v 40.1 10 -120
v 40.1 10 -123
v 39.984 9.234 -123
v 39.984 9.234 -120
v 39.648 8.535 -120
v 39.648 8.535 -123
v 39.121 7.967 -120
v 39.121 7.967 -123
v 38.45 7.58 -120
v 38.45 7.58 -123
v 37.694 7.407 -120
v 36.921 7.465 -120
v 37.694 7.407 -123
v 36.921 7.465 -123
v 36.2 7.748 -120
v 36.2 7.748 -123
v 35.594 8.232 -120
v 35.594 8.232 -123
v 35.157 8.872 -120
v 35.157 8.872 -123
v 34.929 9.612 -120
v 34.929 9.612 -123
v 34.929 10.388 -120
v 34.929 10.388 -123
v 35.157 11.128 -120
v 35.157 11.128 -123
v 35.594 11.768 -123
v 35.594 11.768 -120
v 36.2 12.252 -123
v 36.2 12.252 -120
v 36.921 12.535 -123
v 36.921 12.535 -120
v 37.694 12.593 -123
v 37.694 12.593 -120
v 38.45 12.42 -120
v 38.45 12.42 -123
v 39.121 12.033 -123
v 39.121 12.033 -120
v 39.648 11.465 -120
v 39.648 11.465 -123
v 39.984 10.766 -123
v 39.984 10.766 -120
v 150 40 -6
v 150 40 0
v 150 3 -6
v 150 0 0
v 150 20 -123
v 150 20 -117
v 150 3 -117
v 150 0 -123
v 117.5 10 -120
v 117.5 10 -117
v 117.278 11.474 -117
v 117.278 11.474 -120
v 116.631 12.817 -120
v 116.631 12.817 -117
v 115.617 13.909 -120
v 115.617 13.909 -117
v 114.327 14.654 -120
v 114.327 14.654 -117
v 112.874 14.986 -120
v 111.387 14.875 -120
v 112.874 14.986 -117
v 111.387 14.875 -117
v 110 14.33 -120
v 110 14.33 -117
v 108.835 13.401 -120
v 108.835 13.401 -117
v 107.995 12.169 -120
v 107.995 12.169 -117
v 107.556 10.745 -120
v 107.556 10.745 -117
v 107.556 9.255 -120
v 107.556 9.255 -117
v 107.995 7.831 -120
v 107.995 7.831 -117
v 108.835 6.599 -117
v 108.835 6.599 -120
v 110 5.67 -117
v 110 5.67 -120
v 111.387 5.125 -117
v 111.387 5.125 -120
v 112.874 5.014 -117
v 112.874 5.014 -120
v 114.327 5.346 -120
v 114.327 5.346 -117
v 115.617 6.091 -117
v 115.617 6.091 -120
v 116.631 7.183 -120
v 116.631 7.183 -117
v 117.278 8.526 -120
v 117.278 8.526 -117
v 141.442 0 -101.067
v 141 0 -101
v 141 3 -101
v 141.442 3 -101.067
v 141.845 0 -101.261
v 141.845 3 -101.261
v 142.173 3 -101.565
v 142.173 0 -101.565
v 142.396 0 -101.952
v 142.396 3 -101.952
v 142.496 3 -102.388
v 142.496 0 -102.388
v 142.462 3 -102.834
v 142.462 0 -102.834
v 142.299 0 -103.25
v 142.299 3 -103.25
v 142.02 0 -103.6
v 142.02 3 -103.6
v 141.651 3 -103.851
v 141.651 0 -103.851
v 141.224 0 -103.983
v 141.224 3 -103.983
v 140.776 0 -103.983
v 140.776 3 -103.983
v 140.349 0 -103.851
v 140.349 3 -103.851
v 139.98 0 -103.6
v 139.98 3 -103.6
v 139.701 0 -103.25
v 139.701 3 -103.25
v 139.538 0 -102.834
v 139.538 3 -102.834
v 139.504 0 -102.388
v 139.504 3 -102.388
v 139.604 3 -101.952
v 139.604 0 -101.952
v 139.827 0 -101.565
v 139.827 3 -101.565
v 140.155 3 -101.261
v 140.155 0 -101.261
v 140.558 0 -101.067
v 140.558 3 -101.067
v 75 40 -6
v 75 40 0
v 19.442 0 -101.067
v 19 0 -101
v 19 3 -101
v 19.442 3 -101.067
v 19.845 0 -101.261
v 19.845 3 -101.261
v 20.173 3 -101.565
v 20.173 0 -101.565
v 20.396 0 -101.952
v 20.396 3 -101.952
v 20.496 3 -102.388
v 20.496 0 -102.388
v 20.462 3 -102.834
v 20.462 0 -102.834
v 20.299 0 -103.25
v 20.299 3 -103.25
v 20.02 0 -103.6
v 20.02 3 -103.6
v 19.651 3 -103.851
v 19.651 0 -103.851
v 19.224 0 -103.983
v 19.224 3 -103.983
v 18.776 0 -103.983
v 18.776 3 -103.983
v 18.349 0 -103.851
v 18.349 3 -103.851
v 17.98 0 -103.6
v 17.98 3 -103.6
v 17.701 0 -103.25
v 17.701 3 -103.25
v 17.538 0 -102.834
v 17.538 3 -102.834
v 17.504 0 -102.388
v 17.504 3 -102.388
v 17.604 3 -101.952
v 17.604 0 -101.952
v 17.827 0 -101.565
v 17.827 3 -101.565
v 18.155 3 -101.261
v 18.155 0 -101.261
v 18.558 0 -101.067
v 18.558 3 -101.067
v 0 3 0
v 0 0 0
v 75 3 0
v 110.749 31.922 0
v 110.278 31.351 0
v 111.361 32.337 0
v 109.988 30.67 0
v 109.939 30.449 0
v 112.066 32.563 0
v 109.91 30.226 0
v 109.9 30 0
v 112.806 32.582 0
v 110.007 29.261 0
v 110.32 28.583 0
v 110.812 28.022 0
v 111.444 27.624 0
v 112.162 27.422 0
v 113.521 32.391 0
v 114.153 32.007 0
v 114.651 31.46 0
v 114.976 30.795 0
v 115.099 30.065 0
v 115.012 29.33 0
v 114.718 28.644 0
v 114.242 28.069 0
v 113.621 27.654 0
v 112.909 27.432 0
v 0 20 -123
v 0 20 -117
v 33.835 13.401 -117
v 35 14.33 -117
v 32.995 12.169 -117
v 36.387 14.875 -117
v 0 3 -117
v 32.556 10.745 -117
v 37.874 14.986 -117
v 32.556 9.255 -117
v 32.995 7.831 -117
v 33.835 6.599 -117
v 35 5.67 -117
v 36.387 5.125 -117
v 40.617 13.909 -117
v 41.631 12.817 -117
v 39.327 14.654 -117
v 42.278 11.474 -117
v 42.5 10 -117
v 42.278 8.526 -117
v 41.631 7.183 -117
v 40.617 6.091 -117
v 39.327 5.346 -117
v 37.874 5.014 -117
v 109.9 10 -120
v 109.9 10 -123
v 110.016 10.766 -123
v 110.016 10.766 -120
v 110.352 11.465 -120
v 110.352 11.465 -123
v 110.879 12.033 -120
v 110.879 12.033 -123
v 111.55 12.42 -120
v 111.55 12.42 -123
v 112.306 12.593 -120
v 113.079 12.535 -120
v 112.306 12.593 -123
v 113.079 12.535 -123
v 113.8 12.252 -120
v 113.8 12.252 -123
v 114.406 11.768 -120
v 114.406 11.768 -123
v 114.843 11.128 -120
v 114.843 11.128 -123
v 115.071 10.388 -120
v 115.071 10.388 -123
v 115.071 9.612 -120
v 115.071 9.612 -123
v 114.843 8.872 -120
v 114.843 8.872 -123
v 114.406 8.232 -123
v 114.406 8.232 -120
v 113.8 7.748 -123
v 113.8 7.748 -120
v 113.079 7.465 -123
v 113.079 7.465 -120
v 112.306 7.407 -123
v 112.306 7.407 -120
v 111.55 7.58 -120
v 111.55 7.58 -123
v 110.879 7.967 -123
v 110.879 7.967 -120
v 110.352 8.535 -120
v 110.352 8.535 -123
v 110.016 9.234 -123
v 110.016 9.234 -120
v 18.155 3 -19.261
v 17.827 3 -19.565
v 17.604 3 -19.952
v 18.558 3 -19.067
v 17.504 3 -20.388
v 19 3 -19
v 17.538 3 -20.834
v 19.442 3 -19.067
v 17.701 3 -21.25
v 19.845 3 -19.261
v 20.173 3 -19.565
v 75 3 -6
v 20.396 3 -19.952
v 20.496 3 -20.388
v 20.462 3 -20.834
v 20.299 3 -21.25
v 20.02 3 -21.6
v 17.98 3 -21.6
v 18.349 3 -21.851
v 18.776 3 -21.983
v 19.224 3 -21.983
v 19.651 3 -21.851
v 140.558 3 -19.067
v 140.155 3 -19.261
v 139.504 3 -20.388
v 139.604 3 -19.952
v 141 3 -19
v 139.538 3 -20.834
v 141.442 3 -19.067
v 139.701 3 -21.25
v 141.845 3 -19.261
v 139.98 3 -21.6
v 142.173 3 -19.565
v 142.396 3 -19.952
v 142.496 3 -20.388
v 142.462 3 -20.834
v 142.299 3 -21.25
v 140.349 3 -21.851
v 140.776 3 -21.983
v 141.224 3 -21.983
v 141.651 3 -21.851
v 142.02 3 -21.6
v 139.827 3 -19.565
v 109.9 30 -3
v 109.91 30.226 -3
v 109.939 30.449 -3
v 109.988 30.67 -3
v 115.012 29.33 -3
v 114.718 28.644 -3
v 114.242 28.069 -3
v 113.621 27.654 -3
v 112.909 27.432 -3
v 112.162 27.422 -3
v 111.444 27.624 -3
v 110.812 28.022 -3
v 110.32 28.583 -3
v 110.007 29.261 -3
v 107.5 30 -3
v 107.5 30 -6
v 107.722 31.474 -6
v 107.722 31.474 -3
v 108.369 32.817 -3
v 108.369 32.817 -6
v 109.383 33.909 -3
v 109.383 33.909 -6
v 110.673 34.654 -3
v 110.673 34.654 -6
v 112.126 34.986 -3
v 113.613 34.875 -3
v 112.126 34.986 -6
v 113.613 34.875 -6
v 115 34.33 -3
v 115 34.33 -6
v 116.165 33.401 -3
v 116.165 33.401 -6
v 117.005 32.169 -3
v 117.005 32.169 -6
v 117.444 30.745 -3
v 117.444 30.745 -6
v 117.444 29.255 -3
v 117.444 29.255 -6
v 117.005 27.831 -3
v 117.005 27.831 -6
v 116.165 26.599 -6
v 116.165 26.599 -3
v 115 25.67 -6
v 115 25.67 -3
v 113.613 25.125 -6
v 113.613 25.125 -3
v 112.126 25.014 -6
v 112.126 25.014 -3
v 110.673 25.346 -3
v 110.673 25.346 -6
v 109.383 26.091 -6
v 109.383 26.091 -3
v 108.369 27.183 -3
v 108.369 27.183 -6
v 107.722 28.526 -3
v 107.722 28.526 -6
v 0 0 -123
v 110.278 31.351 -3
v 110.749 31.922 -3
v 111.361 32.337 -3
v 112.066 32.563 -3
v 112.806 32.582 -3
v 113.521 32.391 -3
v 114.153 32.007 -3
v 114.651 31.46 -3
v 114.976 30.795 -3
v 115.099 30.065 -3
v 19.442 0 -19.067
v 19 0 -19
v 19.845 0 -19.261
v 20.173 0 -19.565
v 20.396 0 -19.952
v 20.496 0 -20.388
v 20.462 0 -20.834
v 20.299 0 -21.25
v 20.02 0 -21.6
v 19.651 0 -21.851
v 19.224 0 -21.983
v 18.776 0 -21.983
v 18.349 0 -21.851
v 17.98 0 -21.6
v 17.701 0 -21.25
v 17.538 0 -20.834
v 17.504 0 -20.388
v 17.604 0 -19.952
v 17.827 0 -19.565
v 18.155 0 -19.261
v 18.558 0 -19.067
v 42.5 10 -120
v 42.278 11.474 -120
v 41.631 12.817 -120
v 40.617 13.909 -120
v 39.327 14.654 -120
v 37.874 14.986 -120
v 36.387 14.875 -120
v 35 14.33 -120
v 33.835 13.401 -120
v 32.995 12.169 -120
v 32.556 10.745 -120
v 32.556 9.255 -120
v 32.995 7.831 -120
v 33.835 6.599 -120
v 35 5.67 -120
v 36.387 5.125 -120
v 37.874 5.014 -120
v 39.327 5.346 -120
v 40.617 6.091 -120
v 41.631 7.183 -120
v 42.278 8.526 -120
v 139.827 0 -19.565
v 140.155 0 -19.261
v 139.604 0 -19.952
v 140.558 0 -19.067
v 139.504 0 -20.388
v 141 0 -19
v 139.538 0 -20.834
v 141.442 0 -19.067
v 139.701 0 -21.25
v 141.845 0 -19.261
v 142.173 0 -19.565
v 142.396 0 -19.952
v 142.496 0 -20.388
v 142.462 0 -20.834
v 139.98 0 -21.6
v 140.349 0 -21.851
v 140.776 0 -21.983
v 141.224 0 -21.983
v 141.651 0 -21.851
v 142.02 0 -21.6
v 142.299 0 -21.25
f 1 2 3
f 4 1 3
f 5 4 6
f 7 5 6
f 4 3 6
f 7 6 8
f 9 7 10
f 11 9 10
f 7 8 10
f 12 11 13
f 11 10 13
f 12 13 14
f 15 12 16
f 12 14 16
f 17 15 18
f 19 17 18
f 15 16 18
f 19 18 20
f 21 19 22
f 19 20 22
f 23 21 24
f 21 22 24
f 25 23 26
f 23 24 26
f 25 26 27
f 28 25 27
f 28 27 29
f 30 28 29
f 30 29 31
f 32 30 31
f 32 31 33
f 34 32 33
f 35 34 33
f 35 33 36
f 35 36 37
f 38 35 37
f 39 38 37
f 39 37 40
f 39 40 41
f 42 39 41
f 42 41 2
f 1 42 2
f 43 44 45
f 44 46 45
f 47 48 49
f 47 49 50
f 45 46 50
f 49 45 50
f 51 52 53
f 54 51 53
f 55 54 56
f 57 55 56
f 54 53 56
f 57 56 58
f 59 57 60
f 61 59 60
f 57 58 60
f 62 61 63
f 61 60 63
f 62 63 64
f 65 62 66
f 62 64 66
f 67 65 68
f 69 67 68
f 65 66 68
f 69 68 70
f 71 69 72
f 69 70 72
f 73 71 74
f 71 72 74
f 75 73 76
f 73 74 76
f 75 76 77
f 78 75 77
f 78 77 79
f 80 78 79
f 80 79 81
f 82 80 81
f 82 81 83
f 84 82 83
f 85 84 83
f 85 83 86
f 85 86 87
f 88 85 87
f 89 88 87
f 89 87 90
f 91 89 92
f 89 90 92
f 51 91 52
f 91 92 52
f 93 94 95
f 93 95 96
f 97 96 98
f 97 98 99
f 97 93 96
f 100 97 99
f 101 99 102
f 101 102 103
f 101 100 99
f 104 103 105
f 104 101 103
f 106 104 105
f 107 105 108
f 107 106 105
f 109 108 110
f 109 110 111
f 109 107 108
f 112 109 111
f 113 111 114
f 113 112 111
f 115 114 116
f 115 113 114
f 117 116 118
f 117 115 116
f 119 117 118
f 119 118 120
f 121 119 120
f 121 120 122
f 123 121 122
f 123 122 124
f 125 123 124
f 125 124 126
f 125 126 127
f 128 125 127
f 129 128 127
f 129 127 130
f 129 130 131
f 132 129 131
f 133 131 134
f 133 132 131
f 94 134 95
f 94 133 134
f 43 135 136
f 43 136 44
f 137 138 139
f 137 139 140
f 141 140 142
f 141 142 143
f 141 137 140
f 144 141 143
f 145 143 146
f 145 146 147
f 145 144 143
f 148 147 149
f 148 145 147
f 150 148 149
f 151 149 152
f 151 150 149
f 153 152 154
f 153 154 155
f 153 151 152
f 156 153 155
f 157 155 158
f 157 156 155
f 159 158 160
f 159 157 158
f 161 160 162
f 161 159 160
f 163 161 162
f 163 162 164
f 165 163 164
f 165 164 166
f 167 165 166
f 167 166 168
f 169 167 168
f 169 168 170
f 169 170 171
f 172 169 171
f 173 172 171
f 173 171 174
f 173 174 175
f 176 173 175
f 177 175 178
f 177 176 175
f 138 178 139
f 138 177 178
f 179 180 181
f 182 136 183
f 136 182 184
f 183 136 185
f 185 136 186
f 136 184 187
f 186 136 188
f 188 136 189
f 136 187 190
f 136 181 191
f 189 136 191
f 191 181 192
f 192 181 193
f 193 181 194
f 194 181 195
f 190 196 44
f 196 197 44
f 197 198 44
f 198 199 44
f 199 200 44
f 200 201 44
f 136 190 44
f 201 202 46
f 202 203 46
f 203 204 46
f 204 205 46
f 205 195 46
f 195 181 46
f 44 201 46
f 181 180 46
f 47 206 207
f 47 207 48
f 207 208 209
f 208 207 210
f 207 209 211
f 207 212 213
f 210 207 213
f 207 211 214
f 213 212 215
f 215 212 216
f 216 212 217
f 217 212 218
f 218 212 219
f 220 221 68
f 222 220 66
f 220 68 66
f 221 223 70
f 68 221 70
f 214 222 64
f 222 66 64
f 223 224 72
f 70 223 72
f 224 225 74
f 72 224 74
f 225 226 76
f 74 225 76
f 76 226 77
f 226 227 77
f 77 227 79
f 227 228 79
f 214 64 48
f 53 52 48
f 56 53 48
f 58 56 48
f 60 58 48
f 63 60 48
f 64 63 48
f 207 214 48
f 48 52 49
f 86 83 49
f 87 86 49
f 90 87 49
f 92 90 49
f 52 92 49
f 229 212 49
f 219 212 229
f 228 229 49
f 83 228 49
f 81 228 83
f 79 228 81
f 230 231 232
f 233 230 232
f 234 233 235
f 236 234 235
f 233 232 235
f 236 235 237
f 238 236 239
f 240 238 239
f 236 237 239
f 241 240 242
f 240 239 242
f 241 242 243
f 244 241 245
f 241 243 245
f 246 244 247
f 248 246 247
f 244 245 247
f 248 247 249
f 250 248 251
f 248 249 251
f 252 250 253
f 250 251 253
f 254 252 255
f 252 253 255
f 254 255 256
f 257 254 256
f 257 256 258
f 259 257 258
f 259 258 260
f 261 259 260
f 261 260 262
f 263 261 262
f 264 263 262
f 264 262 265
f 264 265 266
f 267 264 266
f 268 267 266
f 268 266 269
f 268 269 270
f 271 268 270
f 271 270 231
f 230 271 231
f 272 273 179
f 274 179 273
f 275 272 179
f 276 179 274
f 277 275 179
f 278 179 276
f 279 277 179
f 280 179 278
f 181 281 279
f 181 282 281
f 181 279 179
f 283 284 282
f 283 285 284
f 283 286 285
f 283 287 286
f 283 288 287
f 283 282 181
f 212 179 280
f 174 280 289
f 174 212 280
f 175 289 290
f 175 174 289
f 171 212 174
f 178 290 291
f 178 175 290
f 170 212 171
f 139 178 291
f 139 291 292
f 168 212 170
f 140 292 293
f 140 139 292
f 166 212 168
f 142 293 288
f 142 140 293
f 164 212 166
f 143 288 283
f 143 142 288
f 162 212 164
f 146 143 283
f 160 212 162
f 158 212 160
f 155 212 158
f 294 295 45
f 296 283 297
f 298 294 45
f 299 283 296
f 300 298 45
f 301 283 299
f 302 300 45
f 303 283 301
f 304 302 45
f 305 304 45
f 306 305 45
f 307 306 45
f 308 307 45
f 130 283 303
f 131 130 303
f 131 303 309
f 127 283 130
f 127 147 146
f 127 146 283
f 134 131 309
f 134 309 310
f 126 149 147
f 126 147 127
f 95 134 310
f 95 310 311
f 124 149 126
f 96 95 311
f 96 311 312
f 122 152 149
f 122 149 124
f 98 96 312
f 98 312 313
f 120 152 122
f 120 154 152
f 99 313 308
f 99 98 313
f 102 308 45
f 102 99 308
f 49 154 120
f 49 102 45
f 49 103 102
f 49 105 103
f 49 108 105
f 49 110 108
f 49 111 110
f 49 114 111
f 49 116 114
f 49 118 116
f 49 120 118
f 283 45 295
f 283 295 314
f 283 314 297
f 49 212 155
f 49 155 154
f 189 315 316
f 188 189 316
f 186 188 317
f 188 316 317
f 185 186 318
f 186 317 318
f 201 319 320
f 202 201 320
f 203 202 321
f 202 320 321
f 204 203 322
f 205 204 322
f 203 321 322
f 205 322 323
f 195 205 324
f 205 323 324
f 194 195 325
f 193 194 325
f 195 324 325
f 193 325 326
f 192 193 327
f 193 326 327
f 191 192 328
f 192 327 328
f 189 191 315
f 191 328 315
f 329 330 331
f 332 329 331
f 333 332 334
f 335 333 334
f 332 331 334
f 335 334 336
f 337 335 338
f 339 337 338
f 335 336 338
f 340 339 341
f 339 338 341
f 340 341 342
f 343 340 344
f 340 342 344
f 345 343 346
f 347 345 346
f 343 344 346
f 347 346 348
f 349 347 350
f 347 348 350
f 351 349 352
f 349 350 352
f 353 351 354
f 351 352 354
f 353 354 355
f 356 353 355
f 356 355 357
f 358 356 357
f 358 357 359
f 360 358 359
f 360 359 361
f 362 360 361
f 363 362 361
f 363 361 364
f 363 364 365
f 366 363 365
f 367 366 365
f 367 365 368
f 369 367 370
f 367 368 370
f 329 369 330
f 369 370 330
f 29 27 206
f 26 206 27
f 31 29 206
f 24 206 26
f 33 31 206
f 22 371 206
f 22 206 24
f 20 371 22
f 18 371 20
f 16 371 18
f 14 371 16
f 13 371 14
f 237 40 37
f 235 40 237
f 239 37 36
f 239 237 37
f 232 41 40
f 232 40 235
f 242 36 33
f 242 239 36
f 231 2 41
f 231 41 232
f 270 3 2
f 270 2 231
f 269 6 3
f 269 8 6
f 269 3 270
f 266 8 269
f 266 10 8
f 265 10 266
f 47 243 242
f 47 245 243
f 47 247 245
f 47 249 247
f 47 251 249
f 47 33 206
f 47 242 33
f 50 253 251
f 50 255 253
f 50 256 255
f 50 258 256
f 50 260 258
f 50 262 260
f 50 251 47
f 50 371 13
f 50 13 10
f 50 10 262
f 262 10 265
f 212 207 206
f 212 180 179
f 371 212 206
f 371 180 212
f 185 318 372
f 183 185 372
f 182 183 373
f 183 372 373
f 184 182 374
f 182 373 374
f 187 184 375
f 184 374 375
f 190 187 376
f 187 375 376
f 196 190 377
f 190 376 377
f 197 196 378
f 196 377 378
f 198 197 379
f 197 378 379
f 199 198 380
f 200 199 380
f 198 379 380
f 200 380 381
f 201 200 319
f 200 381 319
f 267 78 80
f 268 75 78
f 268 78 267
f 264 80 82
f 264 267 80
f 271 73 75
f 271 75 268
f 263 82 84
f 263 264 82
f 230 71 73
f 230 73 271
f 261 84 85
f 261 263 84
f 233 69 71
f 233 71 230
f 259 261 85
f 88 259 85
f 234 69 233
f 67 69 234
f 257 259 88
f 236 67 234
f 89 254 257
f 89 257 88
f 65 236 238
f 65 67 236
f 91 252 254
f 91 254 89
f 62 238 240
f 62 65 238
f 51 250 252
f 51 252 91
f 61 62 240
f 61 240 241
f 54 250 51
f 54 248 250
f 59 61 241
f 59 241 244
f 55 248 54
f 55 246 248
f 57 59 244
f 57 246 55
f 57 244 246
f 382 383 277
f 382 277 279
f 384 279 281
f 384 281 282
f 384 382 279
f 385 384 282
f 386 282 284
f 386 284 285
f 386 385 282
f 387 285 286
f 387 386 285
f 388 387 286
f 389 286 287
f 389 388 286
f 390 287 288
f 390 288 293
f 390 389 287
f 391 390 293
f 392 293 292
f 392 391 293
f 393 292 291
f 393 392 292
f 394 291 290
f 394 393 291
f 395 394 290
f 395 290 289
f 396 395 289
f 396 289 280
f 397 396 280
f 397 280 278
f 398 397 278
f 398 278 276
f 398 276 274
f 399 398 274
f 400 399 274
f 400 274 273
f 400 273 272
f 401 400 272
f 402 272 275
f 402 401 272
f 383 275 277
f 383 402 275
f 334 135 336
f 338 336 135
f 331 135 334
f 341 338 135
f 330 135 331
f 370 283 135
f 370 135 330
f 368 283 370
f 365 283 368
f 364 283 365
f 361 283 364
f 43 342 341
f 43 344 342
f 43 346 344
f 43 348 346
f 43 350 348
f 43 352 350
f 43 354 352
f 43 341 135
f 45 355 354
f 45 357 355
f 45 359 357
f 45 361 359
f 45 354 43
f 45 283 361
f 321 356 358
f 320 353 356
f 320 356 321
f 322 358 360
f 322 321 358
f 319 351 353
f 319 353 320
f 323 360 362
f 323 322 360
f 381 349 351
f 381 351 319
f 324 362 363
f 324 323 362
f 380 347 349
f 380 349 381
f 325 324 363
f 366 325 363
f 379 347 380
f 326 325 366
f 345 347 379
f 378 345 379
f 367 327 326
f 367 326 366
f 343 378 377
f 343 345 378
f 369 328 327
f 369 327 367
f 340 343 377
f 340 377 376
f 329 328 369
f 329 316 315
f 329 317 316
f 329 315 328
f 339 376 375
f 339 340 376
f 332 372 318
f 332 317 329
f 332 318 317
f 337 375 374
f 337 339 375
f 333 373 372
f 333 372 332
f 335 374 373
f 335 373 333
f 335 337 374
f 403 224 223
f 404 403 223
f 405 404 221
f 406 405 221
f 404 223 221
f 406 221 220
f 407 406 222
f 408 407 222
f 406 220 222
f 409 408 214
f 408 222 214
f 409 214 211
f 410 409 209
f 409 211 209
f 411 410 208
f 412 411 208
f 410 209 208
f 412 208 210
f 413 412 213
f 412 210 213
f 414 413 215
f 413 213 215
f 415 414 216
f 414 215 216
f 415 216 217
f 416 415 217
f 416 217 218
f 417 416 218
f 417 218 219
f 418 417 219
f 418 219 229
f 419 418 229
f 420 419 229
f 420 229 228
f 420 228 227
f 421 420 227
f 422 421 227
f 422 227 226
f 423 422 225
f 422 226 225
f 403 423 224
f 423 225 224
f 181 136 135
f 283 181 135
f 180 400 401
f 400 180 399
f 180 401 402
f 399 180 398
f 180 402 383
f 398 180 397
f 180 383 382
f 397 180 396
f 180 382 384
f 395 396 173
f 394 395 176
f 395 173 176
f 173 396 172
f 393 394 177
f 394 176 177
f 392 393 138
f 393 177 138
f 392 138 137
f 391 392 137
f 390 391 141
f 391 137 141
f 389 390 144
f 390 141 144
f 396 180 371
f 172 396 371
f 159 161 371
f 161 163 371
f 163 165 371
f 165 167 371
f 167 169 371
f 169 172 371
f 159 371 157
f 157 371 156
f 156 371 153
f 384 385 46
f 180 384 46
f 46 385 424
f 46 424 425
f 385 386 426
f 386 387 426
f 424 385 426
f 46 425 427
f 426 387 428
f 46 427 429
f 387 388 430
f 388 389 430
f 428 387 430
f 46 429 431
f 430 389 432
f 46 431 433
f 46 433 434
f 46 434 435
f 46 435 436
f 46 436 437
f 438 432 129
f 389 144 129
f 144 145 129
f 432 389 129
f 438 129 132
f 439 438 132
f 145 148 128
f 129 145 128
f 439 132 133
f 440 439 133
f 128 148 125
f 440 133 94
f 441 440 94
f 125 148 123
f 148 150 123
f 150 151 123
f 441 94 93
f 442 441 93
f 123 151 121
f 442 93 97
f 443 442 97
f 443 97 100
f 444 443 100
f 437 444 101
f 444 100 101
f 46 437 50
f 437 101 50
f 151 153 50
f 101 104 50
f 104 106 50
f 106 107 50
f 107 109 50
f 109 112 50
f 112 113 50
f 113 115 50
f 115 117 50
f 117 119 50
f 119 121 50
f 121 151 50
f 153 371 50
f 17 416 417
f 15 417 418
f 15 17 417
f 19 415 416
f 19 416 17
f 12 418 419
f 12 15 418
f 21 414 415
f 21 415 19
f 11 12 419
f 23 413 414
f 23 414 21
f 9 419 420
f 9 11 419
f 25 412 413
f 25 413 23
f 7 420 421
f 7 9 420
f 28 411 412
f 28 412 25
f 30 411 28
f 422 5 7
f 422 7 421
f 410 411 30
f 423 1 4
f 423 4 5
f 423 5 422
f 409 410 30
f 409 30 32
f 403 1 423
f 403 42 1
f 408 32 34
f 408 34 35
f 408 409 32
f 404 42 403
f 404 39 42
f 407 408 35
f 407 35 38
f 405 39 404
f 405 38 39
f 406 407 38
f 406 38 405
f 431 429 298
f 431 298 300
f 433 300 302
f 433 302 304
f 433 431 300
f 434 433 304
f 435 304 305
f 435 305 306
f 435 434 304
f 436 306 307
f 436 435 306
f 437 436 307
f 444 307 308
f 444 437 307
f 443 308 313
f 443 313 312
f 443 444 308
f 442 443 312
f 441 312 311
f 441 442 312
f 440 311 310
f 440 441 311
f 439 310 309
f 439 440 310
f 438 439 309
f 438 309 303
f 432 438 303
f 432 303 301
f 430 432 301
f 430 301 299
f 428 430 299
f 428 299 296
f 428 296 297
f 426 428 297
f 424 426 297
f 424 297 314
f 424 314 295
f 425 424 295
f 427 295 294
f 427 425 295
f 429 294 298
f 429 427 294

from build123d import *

# Parameters (mm, degrees)
SKETCH_1_W          = 150
SKETCH_1_H          = 123
SKETCH_1_R          = 1.5
EXTRUDE_1_DEPTH     = 3
SKETCH_2_W          = 150
SKETCH_2_H          = 6
EXTRUDE_2_DEPTH     = 17
SKETCH_3_W          = 75
SKETCH_3_H          = 6
EXTRUDE_3_DEPTH     = 37
CUT_EXTRUDE_1_DEPTH = 37
SKETCH_5_R          = 5
CUT_EXTRUDE_2_DEPTH = 3
CUT_EXTRUDE_3_DEPTH = 6
SKETCH_7_R          = 5
CUT_EXTRUDE_4_DEPTH = 3


with BuildPart() as part:
    # 草图1 → 凸台-拉伸1 (new body)
    with BuildSketch(Plane(origin=(0, 0, 0), x_dir=(1, 0, 0), z_dir=(0, 1, 0))):
        with Locations((75, 61.5)):
            Rectangle(SKETCH_1_W, SKETCH_1_H)
        with Locations(Location((19, 102.5, 0), (0, 0, 270))):
            Circle(SKETCH_1_R, mode=Mode.SUBTRACT)
        with Locations(Location((19, 20.5, 0), (0, 0, 270))):
            Circle(SKETCH_1_R, mode=Mode.SUBTRACT)
        with Locations(Location((141, 20.5, 0), (0, 0, 270))):
            Circle(SKETCH_1_R, mode=Mode.SUBTRACT)
        with Locations(Location((141, 102.5, 0), (0, 0, 270))):
            Circle(SKETCH_1_R, mode=Mode.SUBTRACT)
    extrude(amount=EXTRUDE_1_DEPTH)

    # 草图2 → 凸台-拉伸2 (add)
    with BuildSketch(Plane(origin=(0, 3, 0), x_dir=(1, 0, 0), z_dir=(0, 1, 0))):
        with Locations((75, 120)):
            Rectangle(SKETCH_2_W, SKETCH_2_H)
    extrude(amount=EXTRUDE_2_DEPTH)

    # 草图3 → 凸台-拉伸3 (add)
    with BuildSketch(Plane(origin=(0, 3, 0), x_dir=(1, 0, 0), z_dir=(0, 1, 0))):
        with Locations((112.5, 3)):
            Rectangle(SKETCH_3_W, SKETCH_3_H)
    extrude(amount=EXTRUDE_3_DEPTH)

    # 草图4 → 切除-拉伸1 (cut)
    with BuildSketch(Plane(origin=(0, 0, -6), x_dir=(-1, 0, 0), z_dir=(0, 0, -1))):
        with BuildLine():
            ThreePointArc((-109.987789157, 30.669922891), (-113.169922891, 32.512210843), (-115.012210843, 29.330077109))
            Line((-115.012210843, 29.330077109), (-109.987789157, 30.669922891))
        make_face()
        with BuildLine():
            Line((-109.987789157, 30.669922891), (-115.012210843, 29.330077109))
            ThreePointArc((-115.012210843, 29.330077109), (-112.162174743, 27.422040711), (-109.9, 30))
            ThreePointArc((-109.9, 30), (-109.922040711, 30.337825257), (-109.987789157, 30.669922891))
        make_face()
    extrude(amount=-CUT_EXTRUDE_1_DEPTH, mode=Mode.SUBTRACT)

    # 草图5 → 切除-拉伸2 (cut)
    with BuildSketch(Plane(origin=(0, 0, -6), x_dir=(-1, 0, 0), z_dir=(0, 0, -1))):
        with Locations((-112.5, 30)):
            Circle(SKETCH_5_R)
    extrude(amount=-CUT_EXTRUDE_2_DEPTH, mode=Mode.SUBTRACT)

    # 草图6 → 切除-拉伸3 (cut)
    with BuildSketch(Plane(origin=(0, 0, -123), x_dir=(-1, 0, 0), z_dir=(0, 0, -1))):
        with BuildLine():
            ThreePointArc((-115.1, 10), (-112.5, 7.4), (-109.9, 10))
            Line((-109.9, 10), (-115.1, 10))
        make_face()
        with BuildLine():
            Line((-115.1, 10), (-109.9, 10))
            ThreePointArc((-109.9, 10), (-112.5, 12.6), (-115.1, 10))
        make_face()
        with BuildLine():
            ThreePointArc((-34.9, 10), (-37.5, 12.6), (-40.1, 10))
            Line((-40.1, 10), (-34.9, 10))
        make_face()
        with BuildLine():
            Line((-34.9, 10), (-40.1, 10))
            ThreePointArc((-40.1, 10), (-37.5, 7.4), (-34.9, 10))
        make_face()
    extrude(amount=-CUT_EXTRUDE_3_DEPTH, mode=Mode.SUBTRACT)

    # 草图7 → 切除-拉伸4 (cut)
    with BuildSketch(Plane.XY.offset(-117)):
        with Locations((37.5, 10)):
            Circle(SKETCH_7_R)
        with Locations((112.5, 10)):
            Circle(SKETCH_7_R)
    extrude(amount=-CUT_EXTRUDE_4_DEPTH, mode=Mode.SUBTRACT)


solid = part.part
